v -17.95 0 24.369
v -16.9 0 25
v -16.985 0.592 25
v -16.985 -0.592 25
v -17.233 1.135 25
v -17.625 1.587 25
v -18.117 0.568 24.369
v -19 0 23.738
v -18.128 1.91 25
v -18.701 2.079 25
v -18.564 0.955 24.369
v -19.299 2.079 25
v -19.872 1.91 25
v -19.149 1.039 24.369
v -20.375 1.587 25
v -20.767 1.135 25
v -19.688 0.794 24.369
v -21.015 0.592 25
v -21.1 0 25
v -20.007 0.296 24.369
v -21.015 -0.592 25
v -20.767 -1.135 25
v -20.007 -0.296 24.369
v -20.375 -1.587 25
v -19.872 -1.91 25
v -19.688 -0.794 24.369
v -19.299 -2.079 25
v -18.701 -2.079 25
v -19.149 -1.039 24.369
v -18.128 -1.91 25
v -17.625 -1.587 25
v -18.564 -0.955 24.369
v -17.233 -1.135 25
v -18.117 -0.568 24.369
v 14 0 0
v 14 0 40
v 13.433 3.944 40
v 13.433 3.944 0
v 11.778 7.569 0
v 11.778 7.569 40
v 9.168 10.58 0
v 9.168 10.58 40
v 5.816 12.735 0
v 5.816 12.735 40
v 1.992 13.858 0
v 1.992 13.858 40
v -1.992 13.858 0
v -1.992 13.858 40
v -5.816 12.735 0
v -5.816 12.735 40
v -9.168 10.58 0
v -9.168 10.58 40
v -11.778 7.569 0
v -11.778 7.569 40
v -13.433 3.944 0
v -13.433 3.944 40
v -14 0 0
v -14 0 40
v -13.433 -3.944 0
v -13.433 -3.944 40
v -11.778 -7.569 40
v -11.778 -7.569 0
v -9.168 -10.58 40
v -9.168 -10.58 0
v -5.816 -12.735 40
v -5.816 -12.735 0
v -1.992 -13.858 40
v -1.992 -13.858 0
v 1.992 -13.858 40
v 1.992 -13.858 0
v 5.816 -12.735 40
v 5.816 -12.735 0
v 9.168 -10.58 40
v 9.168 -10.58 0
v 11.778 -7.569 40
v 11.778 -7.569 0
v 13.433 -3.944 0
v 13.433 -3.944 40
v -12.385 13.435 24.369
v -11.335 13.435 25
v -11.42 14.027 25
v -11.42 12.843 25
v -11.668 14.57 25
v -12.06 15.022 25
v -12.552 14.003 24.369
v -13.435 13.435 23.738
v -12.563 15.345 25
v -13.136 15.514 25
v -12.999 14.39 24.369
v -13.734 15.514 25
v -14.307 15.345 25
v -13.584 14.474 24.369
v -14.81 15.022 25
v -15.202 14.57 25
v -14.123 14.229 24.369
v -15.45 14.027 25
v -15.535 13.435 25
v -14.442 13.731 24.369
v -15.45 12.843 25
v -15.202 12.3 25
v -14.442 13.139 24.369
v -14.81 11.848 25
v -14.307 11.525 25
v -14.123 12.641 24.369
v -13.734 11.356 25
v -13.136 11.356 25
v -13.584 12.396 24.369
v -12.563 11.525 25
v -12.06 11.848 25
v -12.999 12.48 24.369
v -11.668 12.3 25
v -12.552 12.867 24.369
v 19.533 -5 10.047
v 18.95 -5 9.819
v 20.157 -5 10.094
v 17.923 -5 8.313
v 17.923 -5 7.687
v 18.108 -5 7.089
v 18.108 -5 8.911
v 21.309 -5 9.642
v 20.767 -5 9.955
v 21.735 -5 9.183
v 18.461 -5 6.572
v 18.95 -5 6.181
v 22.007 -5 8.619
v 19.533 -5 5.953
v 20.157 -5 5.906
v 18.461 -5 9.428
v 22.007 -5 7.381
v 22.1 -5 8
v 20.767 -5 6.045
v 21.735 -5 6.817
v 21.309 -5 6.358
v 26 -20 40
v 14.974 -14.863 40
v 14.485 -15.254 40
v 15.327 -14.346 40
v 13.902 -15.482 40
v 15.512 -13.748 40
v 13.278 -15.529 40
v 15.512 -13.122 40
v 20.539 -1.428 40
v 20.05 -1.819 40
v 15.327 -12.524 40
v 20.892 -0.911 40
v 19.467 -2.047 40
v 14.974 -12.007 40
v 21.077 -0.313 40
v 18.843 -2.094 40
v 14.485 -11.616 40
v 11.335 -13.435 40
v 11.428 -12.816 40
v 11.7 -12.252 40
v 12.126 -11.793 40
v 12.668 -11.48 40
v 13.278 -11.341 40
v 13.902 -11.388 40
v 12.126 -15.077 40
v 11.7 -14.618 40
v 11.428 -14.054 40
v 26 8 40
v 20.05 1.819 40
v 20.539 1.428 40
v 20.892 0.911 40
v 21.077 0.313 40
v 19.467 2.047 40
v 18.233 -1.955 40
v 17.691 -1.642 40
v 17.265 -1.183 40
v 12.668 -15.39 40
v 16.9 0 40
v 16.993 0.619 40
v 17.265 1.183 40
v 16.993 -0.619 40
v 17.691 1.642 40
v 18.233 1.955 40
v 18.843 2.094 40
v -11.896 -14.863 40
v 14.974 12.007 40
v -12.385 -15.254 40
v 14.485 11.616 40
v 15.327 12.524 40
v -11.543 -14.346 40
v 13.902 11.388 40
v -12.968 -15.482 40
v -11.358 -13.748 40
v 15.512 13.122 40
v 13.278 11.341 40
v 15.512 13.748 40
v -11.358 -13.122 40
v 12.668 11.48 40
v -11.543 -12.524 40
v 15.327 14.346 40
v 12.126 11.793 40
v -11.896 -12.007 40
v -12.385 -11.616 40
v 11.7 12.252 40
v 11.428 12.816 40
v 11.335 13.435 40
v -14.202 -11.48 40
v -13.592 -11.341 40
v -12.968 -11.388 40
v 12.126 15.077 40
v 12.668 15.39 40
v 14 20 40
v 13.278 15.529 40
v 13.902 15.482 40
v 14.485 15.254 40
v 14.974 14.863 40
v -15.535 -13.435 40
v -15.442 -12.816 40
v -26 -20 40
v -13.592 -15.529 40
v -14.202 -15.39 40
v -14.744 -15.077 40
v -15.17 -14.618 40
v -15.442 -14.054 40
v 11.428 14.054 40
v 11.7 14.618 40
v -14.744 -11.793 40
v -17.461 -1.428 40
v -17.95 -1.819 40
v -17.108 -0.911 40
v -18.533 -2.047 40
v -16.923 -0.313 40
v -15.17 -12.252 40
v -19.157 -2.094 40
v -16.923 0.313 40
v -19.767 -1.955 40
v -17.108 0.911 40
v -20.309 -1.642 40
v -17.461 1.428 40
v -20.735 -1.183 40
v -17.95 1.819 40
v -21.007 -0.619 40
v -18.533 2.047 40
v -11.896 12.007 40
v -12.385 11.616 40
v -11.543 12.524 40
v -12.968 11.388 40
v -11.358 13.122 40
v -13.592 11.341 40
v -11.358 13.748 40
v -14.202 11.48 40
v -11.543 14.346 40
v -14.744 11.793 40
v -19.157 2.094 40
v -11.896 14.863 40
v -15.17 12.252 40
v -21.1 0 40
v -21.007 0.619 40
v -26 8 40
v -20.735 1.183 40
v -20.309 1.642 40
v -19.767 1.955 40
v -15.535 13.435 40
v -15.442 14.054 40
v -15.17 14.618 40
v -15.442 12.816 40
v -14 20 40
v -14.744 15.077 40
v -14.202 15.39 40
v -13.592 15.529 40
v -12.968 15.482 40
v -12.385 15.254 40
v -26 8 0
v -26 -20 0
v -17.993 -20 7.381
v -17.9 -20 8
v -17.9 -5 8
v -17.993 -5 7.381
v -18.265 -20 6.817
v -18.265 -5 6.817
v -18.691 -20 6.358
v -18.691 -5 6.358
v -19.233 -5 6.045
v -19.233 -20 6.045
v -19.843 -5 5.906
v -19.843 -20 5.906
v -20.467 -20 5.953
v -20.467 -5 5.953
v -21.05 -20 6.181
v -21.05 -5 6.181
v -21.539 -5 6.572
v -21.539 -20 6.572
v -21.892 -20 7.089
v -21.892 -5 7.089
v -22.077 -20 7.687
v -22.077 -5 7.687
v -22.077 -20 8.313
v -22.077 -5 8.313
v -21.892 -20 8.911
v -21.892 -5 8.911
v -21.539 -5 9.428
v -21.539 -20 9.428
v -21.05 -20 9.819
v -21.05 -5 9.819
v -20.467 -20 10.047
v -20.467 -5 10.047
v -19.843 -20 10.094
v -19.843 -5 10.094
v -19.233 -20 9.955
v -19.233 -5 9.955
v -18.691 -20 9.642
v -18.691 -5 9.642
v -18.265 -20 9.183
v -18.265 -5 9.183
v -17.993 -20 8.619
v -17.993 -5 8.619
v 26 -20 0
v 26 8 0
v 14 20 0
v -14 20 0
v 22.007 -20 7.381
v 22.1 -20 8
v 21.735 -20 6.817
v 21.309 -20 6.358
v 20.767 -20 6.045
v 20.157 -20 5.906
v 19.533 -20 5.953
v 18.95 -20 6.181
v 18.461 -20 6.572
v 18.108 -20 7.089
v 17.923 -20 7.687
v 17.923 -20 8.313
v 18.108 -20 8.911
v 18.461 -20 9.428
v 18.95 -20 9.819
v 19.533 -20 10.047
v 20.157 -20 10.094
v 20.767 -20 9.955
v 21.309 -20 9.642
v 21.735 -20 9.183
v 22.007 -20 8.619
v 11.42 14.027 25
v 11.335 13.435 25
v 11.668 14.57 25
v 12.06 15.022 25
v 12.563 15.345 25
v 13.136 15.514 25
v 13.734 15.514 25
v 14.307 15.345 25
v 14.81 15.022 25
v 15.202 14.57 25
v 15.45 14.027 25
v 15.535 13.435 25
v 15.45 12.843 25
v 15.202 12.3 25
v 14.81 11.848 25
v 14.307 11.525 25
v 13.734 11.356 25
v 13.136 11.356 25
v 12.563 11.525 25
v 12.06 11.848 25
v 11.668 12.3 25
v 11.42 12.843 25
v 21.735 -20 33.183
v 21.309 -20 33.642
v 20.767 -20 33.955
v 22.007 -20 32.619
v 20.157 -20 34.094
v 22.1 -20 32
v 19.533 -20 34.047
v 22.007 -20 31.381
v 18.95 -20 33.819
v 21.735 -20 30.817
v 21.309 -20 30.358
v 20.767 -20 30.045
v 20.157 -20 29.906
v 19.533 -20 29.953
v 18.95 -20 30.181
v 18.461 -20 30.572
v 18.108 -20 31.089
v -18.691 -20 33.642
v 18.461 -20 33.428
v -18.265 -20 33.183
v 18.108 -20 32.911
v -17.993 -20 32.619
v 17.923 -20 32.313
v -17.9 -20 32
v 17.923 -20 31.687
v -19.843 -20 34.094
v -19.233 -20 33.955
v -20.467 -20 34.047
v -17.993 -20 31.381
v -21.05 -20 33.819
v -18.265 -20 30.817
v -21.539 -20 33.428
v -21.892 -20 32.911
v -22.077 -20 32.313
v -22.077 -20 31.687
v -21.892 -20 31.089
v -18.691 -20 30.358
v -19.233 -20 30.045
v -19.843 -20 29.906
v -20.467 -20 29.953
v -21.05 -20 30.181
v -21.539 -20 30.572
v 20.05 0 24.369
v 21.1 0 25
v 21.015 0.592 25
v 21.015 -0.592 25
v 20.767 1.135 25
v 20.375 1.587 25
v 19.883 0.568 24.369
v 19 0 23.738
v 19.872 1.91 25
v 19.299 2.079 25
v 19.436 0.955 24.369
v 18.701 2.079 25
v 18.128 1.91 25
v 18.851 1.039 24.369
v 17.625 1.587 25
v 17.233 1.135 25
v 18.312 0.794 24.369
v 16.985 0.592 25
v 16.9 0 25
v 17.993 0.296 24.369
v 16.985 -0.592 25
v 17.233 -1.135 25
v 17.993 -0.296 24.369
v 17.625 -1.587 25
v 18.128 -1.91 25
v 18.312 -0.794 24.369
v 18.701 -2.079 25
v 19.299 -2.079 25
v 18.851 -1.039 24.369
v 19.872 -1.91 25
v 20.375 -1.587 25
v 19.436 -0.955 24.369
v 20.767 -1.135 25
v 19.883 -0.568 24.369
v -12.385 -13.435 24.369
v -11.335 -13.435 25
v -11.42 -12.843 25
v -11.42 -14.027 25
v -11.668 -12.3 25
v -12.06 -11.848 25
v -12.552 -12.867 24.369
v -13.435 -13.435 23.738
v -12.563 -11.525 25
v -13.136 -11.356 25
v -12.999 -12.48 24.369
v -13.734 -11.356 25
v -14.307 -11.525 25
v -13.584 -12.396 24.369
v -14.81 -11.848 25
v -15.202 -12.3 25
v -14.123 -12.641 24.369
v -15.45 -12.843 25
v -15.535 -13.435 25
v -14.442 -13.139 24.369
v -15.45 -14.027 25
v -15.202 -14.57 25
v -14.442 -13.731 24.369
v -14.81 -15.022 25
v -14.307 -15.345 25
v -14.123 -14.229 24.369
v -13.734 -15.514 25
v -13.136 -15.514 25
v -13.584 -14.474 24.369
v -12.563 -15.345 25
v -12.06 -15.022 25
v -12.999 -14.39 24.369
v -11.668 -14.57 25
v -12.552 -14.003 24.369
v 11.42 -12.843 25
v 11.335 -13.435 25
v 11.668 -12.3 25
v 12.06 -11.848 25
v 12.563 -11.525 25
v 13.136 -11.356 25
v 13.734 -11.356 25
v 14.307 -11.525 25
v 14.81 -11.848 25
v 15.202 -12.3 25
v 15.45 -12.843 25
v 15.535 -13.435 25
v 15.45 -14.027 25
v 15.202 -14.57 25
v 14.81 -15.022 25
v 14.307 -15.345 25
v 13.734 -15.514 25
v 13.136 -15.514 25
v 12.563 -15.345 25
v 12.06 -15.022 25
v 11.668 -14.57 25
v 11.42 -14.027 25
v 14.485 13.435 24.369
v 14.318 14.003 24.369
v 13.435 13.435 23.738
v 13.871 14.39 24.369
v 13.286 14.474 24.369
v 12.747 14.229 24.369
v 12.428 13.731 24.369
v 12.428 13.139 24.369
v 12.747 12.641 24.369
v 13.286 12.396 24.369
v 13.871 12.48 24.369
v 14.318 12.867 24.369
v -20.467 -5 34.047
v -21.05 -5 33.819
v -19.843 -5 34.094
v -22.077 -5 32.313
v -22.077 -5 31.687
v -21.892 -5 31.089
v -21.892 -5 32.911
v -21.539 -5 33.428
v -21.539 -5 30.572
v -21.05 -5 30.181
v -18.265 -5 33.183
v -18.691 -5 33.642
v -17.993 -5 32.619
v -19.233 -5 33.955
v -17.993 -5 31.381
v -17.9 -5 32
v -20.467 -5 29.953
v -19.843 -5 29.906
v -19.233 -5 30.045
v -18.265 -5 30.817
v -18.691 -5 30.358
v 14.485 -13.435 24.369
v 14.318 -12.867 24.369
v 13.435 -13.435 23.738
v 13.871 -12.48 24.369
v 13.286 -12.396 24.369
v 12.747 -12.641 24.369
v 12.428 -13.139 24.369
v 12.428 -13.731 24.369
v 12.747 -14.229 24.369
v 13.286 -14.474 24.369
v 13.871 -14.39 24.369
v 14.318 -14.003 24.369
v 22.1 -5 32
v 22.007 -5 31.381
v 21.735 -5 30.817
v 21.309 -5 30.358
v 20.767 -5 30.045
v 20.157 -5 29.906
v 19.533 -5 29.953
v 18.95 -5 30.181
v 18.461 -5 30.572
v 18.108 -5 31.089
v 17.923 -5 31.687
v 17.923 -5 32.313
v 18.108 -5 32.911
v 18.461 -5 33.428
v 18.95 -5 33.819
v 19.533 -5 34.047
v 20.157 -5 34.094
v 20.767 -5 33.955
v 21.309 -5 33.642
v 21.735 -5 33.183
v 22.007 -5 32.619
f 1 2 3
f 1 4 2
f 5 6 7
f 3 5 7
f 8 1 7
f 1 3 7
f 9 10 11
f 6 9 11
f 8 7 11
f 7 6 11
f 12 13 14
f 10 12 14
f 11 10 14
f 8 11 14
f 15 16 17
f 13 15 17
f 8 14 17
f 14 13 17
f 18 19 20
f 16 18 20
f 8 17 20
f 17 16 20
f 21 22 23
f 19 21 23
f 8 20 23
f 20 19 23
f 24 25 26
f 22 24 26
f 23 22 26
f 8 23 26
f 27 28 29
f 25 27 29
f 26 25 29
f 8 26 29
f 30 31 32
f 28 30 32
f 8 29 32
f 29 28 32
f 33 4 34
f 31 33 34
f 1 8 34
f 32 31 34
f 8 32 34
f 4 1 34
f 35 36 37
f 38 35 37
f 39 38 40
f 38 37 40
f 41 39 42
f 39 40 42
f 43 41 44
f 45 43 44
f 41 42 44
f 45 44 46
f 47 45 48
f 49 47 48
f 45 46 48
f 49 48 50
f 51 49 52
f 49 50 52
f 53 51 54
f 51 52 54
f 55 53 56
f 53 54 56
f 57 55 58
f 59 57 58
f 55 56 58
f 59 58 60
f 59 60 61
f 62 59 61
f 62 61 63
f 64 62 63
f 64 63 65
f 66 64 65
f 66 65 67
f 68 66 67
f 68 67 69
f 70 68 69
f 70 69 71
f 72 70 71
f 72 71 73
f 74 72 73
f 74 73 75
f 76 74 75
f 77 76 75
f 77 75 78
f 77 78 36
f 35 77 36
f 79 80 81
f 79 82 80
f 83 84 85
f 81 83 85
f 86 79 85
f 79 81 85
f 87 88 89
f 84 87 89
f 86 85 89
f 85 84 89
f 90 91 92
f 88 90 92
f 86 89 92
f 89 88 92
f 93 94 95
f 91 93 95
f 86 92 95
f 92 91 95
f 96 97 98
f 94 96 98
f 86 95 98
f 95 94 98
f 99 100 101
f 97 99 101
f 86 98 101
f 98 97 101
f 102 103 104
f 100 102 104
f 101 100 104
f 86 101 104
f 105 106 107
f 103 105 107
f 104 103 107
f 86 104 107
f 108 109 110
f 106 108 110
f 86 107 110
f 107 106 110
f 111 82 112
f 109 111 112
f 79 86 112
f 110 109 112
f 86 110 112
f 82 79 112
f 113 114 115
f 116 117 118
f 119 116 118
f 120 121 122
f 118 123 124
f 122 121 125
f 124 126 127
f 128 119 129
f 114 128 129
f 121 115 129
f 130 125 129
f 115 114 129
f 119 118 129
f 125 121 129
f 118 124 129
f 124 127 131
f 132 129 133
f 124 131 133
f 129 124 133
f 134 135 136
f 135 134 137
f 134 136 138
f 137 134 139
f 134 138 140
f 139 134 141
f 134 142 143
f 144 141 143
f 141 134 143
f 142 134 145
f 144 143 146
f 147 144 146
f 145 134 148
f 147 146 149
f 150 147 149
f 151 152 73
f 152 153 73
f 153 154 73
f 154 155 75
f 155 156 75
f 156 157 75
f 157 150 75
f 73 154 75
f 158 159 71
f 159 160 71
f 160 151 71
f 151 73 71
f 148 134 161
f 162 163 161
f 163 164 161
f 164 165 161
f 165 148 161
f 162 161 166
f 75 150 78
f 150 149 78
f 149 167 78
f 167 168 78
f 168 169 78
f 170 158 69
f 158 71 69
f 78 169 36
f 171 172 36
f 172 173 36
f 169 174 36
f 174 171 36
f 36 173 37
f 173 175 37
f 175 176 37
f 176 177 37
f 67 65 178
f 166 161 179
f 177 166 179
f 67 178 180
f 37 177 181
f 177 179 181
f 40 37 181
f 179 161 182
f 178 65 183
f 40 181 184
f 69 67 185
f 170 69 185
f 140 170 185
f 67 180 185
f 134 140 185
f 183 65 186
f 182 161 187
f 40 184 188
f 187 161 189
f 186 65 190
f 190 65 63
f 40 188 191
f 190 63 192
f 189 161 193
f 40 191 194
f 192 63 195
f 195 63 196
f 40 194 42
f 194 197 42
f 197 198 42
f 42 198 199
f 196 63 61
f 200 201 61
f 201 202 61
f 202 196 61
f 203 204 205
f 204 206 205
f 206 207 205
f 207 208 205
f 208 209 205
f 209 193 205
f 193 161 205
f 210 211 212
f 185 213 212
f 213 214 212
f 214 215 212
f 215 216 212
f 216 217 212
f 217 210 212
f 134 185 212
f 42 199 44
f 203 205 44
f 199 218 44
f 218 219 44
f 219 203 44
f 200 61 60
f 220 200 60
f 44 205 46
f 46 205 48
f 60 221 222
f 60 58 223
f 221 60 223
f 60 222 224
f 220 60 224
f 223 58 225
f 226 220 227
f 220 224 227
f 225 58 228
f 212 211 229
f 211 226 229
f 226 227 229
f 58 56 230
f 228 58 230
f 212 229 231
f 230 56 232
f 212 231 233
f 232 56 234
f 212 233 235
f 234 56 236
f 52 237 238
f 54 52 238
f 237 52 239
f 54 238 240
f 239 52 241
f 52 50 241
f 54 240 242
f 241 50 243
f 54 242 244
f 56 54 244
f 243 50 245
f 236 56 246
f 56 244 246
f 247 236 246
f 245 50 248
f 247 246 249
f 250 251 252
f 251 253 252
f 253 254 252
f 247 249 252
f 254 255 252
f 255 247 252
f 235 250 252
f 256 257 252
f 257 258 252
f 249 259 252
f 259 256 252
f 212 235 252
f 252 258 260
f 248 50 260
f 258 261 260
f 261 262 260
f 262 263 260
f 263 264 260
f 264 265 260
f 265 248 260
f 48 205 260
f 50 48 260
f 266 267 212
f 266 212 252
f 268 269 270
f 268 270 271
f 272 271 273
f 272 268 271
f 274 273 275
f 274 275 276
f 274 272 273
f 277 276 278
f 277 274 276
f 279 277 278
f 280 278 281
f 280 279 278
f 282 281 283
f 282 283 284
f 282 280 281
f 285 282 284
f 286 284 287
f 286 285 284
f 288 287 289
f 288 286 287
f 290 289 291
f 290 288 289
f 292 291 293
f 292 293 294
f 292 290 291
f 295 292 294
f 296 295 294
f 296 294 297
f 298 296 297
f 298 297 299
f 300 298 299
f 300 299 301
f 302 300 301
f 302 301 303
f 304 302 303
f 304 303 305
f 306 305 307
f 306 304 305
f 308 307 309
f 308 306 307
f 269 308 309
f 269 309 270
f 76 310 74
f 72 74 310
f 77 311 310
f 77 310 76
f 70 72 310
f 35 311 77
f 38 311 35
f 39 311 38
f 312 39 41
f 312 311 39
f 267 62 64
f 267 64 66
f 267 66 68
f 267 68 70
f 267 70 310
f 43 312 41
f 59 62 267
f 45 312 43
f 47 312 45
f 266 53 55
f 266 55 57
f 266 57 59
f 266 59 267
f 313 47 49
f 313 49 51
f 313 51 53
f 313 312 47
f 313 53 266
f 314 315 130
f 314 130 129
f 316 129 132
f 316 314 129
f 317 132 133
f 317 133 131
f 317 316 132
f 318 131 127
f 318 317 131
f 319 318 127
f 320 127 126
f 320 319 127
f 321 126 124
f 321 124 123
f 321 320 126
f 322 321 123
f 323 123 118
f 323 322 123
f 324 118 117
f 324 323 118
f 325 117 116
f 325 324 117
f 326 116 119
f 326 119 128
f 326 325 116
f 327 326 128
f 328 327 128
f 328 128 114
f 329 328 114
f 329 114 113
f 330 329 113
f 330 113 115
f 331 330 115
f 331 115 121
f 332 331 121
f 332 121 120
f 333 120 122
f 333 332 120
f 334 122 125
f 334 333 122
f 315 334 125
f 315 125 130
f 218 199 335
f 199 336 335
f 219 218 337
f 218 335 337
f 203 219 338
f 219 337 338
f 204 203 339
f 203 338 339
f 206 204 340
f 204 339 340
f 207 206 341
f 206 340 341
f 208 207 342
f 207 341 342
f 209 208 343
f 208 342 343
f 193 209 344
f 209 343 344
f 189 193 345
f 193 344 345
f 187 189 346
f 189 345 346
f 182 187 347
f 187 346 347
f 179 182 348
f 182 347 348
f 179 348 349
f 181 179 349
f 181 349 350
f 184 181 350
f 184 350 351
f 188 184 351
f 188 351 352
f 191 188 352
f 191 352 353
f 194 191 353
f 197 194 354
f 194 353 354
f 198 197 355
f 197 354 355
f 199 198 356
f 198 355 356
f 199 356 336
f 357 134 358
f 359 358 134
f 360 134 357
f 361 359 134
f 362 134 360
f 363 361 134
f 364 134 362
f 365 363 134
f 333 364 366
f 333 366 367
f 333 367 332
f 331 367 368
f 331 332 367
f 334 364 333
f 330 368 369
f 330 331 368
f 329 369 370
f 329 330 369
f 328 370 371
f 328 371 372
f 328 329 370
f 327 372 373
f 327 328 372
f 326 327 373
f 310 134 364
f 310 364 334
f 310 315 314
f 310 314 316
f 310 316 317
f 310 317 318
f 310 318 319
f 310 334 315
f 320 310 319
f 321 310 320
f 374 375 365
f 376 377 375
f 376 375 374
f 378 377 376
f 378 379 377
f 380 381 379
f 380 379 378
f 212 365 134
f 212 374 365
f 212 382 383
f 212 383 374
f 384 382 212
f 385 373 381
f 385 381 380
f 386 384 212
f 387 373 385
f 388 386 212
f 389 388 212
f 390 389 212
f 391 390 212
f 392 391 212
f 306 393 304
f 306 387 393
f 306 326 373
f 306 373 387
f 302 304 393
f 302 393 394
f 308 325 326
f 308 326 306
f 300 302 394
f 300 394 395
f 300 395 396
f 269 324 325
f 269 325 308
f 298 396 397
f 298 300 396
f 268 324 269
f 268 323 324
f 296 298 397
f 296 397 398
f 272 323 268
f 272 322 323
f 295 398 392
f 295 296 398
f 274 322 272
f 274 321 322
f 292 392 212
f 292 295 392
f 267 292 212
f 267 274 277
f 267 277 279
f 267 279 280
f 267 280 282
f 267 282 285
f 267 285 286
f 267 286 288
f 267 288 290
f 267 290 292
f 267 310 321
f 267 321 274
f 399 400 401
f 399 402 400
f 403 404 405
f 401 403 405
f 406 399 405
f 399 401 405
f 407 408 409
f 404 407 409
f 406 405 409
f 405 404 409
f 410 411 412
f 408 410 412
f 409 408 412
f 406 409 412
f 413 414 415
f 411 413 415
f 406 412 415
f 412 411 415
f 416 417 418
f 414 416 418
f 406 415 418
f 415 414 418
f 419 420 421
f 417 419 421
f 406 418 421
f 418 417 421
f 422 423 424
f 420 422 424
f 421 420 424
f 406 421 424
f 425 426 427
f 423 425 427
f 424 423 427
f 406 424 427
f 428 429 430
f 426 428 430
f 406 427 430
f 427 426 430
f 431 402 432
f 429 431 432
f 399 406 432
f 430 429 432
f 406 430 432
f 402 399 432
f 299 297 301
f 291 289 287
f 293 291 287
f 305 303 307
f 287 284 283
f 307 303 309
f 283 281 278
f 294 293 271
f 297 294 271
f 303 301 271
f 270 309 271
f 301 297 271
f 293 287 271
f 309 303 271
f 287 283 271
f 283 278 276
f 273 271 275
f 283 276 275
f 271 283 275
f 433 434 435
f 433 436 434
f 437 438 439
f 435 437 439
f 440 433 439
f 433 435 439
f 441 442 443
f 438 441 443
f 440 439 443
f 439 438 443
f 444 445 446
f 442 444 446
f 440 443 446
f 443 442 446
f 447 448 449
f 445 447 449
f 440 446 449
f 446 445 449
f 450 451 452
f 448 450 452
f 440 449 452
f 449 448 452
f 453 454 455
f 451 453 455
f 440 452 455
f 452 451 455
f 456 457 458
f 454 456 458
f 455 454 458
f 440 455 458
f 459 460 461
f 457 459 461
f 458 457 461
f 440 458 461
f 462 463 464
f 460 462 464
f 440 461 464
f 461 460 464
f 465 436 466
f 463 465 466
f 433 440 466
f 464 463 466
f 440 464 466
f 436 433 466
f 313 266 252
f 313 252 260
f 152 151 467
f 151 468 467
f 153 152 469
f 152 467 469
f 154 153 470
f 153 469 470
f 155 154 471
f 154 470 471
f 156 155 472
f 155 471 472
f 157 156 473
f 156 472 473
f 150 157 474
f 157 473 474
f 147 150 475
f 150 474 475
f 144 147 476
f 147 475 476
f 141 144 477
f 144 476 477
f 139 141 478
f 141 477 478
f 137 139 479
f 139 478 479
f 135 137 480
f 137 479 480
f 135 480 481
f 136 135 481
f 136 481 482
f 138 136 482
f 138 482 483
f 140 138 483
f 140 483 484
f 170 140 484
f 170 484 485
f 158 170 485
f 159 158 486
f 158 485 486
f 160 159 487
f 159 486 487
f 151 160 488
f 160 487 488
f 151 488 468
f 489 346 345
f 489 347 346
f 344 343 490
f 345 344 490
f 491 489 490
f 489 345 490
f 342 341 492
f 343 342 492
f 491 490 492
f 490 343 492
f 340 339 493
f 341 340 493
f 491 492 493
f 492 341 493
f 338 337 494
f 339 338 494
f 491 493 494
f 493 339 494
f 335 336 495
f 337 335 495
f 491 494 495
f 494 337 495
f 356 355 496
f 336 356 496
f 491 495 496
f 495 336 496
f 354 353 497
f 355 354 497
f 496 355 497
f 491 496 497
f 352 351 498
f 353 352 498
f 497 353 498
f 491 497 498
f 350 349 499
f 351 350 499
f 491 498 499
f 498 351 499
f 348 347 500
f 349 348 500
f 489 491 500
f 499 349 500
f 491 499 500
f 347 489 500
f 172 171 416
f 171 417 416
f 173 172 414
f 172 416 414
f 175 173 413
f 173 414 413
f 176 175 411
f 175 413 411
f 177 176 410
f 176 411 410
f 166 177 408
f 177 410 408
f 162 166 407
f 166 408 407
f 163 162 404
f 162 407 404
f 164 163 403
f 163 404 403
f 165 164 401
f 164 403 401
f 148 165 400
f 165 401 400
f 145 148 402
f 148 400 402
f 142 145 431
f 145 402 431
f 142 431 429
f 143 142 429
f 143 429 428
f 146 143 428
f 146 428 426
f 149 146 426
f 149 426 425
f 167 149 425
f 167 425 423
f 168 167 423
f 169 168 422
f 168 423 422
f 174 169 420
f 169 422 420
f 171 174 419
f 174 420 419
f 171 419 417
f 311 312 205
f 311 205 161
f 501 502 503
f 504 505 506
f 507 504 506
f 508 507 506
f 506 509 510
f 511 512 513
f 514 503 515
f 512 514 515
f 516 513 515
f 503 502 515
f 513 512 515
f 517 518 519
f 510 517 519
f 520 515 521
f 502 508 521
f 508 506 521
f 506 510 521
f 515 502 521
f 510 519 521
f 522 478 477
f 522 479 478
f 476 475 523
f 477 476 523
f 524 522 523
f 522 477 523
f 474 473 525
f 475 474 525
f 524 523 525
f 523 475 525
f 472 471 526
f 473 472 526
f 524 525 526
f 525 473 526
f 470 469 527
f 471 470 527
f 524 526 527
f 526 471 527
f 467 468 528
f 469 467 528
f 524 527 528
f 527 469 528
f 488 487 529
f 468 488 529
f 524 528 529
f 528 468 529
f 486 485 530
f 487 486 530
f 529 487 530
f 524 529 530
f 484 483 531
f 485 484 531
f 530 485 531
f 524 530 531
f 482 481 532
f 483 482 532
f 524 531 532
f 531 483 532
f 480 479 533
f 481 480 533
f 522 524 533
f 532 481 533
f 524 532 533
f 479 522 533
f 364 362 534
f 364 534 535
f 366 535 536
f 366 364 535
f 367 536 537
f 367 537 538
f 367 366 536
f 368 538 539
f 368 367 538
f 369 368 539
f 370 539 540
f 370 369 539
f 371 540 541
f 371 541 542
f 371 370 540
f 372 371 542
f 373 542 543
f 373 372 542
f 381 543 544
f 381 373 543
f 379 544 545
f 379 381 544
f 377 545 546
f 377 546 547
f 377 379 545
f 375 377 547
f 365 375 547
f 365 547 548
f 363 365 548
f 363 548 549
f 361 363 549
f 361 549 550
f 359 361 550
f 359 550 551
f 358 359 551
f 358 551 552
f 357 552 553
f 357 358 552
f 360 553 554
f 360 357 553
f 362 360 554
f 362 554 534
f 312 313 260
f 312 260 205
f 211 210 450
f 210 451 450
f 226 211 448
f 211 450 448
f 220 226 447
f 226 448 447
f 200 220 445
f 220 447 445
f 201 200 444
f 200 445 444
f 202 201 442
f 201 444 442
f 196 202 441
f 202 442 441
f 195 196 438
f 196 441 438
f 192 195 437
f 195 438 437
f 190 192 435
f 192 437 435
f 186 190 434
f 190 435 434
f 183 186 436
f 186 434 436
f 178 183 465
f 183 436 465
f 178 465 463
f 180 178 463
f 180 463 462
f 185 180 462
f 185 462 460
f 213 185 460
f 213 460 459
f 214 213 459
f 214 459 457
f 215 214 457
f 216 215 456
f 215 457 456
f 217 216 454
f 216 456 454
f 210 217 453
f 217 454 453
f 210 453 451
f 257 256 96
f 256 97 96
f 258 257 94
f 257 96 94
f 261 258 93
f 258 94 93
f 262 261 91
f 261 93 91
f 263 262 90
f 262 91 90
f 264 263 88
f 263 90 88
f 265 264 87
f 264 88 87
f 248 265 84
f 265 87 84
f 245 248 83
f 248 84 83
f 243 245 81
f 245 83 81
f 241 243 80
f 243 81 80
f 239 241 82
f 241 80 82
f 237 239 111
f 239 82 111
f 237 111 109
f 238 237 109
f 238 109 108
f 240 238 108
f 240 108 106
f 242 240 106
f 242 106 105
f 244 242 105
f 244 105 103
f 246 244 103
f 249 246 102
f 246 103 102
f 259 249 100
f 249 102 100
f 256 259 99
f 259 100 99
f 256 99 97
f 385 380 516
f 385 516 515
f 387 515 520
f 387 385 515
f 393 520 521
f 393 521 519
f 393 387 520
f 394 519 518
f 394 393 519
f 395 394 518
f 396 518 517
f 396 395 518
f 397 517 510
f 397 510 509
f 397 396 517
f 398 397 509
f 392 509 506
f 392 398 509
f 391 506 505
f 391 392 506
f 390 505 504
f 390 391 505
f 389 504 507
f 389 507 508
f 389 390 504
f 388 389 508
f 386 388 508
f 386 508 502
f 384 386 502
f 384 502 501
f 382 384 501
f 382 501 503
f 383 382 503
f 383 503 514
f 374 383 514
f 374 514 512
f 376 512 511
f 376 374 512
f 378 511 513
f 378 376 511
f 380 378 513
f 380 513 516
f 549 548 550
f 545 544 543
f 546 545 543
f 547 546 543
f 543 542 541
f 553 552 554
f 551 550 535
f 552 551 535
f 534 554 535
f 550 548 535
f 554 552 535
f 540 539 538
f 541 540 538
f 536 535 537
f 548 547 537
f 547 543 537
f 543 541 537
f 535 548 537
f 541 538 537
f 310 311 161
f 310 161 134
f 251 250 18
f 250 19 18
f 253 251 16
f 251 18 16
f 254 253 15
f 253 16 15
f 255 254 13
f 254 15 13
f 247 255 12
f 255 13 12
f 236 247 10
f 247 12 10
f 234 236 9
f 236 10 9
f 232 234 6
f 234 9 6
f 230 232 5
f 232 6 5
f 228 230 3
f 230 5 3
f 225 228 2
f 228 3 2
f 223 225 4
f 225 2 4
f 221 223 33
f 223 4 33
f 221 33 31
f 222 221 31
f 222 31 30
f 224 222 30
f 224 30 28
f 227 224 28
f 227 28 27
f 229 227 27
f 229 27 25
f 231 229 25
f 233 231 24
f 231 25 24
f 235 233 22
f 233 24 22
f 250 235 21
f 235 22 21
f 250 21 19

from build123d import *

# Parameters (mm, degrees)
SALIENTE_EXTRUIR2_DEPTH   = 40
CROQUIS4_R                = 14
CORTAR_EXTRUIR2_DEPTH     = 41
TALADRO_ROSCADO_M51_D     = 4.2
TALADRO_ROSCADO_M51_DEPTH = 15
TALADRO_ROSCADO_M51_TIP   = 1.2618073
TALADRO_ROSCADO_M52_D     = 4.2
TALADRO_ROSCADO_M52_DEPTH = 15
TALADRO_ROSCADO_M52_TIP   = 1.2618073
TALADRO_ROSCADO_M53_D     = 4.2
TALADRO_ROSCADO_M53_DEPTH = 15
TALADRO_ROSCADO_M53_TIP   = 1.2618073
CROQUIS20_R               = 2.1
CORTAR_EXTRUIR3_DEPTH     = 15


with BuildPart() as part:
    # Croquis3 → Saliente-Extruir2 (new body)
    with BuildSketch(Plane.XY):
        Polygon((-26, 8), (-14, 20), (14, 20), (26, 8), (26, -20), (-26, -20), align=None)
    extrude(amount=SALIENTE_EXTRUIR2_DEPTH)

    # Croquis4 → Cortar-Extruir2 (cut, through all)
    with BuildSketch(Plane.XY.offset(40)):
        Circle(CROQUIS4_R)
    extrude(amount=-CORTAR_EXTRUIR2_DEPTH, mode=Mode.SUBTRACT)

    # Taladro roscado M51
    with Locations(Plane.XY.offset(40)):
        with Locations((-13.435028843, 13.435028843)):
            Hole(TALADRO_ROSCADO_M51_D / 2, depth=TALADRO_ROSCADO_M51_DEPTH)
            with Locations((0, 0, -(TALADRO_ROSCADO_M51_DEPTH + TALADRO_ROSCADO_M51_TIP / 2))):  # 118° drill point
                Cone(0, TALADRO_ROSCADO_M51_D / 2, TALADRO_ROSCADO_M51_TIP, mode=Mode.SUBTRACT)

    # Taladro roscado M52
    with Locations(Plane.XY.offset(40)):
        with Locations((-19, 0)):
            Hole(TALADRO_ROSCADO_M52_D / 2, depth=TALADRO_ROSCADO_M52_DEPTH)
            with Locations((0, 0, -(TALADRO_ROSCADO_M52_DEPTH + TALADRO_ROSCADO_M52_TIP / 2))):  # 118° drill point
                Cone(0, TALADRO_ROSCADO_M52_D / 2, TALADRO_ROSCADO_M52_TIP, mode=Mode.SUBTRACT)

    # Taladro roscado M53
    with Locations(Plane.XY.offset(40)):
        with Locations((-13.435028843, -13.435028843), (13.435028843, -13.435028843), (19, 0), (13.435028843, 13.435028843)):
            Hole(TALADRO_ROSCADO_M53_D / 2, depth=TALADRO_ROSCADO_M53_DEPTH)
            with Locations((0, 0, -(TALADRO_ROSCADO_M53_DEPTH + TALADRO_ROSCADO_M53_TIP / 2))):  # 118° drill point
                Cone(0, TALADRO_ROSCADO_M53_D / 2, TALADRO_ROSCADO_M53_TIP, mode=Mode.SUBTRACT)

    # Croquis20 → Cortar-Extruir3 (cut)
    with BuildSketch(Plane(origin=(0, -20, 0), x_dir=(1, 0, 0), z_dir=(0, 1, 0))):
        with Locations((-20, -32)):
            Circle(CROQUIS20_R)
        with Locations((20, -32)):
            Circle(CROQUIS20_R)
        with Locations((-20, -8)):
            Circle(CROQUIS20_R)
        with Locations((20, -8)):
            Circle(CROQUIS20_R)
    extrude(amount=CORTAR_EXTRUIR3_DEPTH, mode=Mode.SUBTRACT)


solid = part.part
